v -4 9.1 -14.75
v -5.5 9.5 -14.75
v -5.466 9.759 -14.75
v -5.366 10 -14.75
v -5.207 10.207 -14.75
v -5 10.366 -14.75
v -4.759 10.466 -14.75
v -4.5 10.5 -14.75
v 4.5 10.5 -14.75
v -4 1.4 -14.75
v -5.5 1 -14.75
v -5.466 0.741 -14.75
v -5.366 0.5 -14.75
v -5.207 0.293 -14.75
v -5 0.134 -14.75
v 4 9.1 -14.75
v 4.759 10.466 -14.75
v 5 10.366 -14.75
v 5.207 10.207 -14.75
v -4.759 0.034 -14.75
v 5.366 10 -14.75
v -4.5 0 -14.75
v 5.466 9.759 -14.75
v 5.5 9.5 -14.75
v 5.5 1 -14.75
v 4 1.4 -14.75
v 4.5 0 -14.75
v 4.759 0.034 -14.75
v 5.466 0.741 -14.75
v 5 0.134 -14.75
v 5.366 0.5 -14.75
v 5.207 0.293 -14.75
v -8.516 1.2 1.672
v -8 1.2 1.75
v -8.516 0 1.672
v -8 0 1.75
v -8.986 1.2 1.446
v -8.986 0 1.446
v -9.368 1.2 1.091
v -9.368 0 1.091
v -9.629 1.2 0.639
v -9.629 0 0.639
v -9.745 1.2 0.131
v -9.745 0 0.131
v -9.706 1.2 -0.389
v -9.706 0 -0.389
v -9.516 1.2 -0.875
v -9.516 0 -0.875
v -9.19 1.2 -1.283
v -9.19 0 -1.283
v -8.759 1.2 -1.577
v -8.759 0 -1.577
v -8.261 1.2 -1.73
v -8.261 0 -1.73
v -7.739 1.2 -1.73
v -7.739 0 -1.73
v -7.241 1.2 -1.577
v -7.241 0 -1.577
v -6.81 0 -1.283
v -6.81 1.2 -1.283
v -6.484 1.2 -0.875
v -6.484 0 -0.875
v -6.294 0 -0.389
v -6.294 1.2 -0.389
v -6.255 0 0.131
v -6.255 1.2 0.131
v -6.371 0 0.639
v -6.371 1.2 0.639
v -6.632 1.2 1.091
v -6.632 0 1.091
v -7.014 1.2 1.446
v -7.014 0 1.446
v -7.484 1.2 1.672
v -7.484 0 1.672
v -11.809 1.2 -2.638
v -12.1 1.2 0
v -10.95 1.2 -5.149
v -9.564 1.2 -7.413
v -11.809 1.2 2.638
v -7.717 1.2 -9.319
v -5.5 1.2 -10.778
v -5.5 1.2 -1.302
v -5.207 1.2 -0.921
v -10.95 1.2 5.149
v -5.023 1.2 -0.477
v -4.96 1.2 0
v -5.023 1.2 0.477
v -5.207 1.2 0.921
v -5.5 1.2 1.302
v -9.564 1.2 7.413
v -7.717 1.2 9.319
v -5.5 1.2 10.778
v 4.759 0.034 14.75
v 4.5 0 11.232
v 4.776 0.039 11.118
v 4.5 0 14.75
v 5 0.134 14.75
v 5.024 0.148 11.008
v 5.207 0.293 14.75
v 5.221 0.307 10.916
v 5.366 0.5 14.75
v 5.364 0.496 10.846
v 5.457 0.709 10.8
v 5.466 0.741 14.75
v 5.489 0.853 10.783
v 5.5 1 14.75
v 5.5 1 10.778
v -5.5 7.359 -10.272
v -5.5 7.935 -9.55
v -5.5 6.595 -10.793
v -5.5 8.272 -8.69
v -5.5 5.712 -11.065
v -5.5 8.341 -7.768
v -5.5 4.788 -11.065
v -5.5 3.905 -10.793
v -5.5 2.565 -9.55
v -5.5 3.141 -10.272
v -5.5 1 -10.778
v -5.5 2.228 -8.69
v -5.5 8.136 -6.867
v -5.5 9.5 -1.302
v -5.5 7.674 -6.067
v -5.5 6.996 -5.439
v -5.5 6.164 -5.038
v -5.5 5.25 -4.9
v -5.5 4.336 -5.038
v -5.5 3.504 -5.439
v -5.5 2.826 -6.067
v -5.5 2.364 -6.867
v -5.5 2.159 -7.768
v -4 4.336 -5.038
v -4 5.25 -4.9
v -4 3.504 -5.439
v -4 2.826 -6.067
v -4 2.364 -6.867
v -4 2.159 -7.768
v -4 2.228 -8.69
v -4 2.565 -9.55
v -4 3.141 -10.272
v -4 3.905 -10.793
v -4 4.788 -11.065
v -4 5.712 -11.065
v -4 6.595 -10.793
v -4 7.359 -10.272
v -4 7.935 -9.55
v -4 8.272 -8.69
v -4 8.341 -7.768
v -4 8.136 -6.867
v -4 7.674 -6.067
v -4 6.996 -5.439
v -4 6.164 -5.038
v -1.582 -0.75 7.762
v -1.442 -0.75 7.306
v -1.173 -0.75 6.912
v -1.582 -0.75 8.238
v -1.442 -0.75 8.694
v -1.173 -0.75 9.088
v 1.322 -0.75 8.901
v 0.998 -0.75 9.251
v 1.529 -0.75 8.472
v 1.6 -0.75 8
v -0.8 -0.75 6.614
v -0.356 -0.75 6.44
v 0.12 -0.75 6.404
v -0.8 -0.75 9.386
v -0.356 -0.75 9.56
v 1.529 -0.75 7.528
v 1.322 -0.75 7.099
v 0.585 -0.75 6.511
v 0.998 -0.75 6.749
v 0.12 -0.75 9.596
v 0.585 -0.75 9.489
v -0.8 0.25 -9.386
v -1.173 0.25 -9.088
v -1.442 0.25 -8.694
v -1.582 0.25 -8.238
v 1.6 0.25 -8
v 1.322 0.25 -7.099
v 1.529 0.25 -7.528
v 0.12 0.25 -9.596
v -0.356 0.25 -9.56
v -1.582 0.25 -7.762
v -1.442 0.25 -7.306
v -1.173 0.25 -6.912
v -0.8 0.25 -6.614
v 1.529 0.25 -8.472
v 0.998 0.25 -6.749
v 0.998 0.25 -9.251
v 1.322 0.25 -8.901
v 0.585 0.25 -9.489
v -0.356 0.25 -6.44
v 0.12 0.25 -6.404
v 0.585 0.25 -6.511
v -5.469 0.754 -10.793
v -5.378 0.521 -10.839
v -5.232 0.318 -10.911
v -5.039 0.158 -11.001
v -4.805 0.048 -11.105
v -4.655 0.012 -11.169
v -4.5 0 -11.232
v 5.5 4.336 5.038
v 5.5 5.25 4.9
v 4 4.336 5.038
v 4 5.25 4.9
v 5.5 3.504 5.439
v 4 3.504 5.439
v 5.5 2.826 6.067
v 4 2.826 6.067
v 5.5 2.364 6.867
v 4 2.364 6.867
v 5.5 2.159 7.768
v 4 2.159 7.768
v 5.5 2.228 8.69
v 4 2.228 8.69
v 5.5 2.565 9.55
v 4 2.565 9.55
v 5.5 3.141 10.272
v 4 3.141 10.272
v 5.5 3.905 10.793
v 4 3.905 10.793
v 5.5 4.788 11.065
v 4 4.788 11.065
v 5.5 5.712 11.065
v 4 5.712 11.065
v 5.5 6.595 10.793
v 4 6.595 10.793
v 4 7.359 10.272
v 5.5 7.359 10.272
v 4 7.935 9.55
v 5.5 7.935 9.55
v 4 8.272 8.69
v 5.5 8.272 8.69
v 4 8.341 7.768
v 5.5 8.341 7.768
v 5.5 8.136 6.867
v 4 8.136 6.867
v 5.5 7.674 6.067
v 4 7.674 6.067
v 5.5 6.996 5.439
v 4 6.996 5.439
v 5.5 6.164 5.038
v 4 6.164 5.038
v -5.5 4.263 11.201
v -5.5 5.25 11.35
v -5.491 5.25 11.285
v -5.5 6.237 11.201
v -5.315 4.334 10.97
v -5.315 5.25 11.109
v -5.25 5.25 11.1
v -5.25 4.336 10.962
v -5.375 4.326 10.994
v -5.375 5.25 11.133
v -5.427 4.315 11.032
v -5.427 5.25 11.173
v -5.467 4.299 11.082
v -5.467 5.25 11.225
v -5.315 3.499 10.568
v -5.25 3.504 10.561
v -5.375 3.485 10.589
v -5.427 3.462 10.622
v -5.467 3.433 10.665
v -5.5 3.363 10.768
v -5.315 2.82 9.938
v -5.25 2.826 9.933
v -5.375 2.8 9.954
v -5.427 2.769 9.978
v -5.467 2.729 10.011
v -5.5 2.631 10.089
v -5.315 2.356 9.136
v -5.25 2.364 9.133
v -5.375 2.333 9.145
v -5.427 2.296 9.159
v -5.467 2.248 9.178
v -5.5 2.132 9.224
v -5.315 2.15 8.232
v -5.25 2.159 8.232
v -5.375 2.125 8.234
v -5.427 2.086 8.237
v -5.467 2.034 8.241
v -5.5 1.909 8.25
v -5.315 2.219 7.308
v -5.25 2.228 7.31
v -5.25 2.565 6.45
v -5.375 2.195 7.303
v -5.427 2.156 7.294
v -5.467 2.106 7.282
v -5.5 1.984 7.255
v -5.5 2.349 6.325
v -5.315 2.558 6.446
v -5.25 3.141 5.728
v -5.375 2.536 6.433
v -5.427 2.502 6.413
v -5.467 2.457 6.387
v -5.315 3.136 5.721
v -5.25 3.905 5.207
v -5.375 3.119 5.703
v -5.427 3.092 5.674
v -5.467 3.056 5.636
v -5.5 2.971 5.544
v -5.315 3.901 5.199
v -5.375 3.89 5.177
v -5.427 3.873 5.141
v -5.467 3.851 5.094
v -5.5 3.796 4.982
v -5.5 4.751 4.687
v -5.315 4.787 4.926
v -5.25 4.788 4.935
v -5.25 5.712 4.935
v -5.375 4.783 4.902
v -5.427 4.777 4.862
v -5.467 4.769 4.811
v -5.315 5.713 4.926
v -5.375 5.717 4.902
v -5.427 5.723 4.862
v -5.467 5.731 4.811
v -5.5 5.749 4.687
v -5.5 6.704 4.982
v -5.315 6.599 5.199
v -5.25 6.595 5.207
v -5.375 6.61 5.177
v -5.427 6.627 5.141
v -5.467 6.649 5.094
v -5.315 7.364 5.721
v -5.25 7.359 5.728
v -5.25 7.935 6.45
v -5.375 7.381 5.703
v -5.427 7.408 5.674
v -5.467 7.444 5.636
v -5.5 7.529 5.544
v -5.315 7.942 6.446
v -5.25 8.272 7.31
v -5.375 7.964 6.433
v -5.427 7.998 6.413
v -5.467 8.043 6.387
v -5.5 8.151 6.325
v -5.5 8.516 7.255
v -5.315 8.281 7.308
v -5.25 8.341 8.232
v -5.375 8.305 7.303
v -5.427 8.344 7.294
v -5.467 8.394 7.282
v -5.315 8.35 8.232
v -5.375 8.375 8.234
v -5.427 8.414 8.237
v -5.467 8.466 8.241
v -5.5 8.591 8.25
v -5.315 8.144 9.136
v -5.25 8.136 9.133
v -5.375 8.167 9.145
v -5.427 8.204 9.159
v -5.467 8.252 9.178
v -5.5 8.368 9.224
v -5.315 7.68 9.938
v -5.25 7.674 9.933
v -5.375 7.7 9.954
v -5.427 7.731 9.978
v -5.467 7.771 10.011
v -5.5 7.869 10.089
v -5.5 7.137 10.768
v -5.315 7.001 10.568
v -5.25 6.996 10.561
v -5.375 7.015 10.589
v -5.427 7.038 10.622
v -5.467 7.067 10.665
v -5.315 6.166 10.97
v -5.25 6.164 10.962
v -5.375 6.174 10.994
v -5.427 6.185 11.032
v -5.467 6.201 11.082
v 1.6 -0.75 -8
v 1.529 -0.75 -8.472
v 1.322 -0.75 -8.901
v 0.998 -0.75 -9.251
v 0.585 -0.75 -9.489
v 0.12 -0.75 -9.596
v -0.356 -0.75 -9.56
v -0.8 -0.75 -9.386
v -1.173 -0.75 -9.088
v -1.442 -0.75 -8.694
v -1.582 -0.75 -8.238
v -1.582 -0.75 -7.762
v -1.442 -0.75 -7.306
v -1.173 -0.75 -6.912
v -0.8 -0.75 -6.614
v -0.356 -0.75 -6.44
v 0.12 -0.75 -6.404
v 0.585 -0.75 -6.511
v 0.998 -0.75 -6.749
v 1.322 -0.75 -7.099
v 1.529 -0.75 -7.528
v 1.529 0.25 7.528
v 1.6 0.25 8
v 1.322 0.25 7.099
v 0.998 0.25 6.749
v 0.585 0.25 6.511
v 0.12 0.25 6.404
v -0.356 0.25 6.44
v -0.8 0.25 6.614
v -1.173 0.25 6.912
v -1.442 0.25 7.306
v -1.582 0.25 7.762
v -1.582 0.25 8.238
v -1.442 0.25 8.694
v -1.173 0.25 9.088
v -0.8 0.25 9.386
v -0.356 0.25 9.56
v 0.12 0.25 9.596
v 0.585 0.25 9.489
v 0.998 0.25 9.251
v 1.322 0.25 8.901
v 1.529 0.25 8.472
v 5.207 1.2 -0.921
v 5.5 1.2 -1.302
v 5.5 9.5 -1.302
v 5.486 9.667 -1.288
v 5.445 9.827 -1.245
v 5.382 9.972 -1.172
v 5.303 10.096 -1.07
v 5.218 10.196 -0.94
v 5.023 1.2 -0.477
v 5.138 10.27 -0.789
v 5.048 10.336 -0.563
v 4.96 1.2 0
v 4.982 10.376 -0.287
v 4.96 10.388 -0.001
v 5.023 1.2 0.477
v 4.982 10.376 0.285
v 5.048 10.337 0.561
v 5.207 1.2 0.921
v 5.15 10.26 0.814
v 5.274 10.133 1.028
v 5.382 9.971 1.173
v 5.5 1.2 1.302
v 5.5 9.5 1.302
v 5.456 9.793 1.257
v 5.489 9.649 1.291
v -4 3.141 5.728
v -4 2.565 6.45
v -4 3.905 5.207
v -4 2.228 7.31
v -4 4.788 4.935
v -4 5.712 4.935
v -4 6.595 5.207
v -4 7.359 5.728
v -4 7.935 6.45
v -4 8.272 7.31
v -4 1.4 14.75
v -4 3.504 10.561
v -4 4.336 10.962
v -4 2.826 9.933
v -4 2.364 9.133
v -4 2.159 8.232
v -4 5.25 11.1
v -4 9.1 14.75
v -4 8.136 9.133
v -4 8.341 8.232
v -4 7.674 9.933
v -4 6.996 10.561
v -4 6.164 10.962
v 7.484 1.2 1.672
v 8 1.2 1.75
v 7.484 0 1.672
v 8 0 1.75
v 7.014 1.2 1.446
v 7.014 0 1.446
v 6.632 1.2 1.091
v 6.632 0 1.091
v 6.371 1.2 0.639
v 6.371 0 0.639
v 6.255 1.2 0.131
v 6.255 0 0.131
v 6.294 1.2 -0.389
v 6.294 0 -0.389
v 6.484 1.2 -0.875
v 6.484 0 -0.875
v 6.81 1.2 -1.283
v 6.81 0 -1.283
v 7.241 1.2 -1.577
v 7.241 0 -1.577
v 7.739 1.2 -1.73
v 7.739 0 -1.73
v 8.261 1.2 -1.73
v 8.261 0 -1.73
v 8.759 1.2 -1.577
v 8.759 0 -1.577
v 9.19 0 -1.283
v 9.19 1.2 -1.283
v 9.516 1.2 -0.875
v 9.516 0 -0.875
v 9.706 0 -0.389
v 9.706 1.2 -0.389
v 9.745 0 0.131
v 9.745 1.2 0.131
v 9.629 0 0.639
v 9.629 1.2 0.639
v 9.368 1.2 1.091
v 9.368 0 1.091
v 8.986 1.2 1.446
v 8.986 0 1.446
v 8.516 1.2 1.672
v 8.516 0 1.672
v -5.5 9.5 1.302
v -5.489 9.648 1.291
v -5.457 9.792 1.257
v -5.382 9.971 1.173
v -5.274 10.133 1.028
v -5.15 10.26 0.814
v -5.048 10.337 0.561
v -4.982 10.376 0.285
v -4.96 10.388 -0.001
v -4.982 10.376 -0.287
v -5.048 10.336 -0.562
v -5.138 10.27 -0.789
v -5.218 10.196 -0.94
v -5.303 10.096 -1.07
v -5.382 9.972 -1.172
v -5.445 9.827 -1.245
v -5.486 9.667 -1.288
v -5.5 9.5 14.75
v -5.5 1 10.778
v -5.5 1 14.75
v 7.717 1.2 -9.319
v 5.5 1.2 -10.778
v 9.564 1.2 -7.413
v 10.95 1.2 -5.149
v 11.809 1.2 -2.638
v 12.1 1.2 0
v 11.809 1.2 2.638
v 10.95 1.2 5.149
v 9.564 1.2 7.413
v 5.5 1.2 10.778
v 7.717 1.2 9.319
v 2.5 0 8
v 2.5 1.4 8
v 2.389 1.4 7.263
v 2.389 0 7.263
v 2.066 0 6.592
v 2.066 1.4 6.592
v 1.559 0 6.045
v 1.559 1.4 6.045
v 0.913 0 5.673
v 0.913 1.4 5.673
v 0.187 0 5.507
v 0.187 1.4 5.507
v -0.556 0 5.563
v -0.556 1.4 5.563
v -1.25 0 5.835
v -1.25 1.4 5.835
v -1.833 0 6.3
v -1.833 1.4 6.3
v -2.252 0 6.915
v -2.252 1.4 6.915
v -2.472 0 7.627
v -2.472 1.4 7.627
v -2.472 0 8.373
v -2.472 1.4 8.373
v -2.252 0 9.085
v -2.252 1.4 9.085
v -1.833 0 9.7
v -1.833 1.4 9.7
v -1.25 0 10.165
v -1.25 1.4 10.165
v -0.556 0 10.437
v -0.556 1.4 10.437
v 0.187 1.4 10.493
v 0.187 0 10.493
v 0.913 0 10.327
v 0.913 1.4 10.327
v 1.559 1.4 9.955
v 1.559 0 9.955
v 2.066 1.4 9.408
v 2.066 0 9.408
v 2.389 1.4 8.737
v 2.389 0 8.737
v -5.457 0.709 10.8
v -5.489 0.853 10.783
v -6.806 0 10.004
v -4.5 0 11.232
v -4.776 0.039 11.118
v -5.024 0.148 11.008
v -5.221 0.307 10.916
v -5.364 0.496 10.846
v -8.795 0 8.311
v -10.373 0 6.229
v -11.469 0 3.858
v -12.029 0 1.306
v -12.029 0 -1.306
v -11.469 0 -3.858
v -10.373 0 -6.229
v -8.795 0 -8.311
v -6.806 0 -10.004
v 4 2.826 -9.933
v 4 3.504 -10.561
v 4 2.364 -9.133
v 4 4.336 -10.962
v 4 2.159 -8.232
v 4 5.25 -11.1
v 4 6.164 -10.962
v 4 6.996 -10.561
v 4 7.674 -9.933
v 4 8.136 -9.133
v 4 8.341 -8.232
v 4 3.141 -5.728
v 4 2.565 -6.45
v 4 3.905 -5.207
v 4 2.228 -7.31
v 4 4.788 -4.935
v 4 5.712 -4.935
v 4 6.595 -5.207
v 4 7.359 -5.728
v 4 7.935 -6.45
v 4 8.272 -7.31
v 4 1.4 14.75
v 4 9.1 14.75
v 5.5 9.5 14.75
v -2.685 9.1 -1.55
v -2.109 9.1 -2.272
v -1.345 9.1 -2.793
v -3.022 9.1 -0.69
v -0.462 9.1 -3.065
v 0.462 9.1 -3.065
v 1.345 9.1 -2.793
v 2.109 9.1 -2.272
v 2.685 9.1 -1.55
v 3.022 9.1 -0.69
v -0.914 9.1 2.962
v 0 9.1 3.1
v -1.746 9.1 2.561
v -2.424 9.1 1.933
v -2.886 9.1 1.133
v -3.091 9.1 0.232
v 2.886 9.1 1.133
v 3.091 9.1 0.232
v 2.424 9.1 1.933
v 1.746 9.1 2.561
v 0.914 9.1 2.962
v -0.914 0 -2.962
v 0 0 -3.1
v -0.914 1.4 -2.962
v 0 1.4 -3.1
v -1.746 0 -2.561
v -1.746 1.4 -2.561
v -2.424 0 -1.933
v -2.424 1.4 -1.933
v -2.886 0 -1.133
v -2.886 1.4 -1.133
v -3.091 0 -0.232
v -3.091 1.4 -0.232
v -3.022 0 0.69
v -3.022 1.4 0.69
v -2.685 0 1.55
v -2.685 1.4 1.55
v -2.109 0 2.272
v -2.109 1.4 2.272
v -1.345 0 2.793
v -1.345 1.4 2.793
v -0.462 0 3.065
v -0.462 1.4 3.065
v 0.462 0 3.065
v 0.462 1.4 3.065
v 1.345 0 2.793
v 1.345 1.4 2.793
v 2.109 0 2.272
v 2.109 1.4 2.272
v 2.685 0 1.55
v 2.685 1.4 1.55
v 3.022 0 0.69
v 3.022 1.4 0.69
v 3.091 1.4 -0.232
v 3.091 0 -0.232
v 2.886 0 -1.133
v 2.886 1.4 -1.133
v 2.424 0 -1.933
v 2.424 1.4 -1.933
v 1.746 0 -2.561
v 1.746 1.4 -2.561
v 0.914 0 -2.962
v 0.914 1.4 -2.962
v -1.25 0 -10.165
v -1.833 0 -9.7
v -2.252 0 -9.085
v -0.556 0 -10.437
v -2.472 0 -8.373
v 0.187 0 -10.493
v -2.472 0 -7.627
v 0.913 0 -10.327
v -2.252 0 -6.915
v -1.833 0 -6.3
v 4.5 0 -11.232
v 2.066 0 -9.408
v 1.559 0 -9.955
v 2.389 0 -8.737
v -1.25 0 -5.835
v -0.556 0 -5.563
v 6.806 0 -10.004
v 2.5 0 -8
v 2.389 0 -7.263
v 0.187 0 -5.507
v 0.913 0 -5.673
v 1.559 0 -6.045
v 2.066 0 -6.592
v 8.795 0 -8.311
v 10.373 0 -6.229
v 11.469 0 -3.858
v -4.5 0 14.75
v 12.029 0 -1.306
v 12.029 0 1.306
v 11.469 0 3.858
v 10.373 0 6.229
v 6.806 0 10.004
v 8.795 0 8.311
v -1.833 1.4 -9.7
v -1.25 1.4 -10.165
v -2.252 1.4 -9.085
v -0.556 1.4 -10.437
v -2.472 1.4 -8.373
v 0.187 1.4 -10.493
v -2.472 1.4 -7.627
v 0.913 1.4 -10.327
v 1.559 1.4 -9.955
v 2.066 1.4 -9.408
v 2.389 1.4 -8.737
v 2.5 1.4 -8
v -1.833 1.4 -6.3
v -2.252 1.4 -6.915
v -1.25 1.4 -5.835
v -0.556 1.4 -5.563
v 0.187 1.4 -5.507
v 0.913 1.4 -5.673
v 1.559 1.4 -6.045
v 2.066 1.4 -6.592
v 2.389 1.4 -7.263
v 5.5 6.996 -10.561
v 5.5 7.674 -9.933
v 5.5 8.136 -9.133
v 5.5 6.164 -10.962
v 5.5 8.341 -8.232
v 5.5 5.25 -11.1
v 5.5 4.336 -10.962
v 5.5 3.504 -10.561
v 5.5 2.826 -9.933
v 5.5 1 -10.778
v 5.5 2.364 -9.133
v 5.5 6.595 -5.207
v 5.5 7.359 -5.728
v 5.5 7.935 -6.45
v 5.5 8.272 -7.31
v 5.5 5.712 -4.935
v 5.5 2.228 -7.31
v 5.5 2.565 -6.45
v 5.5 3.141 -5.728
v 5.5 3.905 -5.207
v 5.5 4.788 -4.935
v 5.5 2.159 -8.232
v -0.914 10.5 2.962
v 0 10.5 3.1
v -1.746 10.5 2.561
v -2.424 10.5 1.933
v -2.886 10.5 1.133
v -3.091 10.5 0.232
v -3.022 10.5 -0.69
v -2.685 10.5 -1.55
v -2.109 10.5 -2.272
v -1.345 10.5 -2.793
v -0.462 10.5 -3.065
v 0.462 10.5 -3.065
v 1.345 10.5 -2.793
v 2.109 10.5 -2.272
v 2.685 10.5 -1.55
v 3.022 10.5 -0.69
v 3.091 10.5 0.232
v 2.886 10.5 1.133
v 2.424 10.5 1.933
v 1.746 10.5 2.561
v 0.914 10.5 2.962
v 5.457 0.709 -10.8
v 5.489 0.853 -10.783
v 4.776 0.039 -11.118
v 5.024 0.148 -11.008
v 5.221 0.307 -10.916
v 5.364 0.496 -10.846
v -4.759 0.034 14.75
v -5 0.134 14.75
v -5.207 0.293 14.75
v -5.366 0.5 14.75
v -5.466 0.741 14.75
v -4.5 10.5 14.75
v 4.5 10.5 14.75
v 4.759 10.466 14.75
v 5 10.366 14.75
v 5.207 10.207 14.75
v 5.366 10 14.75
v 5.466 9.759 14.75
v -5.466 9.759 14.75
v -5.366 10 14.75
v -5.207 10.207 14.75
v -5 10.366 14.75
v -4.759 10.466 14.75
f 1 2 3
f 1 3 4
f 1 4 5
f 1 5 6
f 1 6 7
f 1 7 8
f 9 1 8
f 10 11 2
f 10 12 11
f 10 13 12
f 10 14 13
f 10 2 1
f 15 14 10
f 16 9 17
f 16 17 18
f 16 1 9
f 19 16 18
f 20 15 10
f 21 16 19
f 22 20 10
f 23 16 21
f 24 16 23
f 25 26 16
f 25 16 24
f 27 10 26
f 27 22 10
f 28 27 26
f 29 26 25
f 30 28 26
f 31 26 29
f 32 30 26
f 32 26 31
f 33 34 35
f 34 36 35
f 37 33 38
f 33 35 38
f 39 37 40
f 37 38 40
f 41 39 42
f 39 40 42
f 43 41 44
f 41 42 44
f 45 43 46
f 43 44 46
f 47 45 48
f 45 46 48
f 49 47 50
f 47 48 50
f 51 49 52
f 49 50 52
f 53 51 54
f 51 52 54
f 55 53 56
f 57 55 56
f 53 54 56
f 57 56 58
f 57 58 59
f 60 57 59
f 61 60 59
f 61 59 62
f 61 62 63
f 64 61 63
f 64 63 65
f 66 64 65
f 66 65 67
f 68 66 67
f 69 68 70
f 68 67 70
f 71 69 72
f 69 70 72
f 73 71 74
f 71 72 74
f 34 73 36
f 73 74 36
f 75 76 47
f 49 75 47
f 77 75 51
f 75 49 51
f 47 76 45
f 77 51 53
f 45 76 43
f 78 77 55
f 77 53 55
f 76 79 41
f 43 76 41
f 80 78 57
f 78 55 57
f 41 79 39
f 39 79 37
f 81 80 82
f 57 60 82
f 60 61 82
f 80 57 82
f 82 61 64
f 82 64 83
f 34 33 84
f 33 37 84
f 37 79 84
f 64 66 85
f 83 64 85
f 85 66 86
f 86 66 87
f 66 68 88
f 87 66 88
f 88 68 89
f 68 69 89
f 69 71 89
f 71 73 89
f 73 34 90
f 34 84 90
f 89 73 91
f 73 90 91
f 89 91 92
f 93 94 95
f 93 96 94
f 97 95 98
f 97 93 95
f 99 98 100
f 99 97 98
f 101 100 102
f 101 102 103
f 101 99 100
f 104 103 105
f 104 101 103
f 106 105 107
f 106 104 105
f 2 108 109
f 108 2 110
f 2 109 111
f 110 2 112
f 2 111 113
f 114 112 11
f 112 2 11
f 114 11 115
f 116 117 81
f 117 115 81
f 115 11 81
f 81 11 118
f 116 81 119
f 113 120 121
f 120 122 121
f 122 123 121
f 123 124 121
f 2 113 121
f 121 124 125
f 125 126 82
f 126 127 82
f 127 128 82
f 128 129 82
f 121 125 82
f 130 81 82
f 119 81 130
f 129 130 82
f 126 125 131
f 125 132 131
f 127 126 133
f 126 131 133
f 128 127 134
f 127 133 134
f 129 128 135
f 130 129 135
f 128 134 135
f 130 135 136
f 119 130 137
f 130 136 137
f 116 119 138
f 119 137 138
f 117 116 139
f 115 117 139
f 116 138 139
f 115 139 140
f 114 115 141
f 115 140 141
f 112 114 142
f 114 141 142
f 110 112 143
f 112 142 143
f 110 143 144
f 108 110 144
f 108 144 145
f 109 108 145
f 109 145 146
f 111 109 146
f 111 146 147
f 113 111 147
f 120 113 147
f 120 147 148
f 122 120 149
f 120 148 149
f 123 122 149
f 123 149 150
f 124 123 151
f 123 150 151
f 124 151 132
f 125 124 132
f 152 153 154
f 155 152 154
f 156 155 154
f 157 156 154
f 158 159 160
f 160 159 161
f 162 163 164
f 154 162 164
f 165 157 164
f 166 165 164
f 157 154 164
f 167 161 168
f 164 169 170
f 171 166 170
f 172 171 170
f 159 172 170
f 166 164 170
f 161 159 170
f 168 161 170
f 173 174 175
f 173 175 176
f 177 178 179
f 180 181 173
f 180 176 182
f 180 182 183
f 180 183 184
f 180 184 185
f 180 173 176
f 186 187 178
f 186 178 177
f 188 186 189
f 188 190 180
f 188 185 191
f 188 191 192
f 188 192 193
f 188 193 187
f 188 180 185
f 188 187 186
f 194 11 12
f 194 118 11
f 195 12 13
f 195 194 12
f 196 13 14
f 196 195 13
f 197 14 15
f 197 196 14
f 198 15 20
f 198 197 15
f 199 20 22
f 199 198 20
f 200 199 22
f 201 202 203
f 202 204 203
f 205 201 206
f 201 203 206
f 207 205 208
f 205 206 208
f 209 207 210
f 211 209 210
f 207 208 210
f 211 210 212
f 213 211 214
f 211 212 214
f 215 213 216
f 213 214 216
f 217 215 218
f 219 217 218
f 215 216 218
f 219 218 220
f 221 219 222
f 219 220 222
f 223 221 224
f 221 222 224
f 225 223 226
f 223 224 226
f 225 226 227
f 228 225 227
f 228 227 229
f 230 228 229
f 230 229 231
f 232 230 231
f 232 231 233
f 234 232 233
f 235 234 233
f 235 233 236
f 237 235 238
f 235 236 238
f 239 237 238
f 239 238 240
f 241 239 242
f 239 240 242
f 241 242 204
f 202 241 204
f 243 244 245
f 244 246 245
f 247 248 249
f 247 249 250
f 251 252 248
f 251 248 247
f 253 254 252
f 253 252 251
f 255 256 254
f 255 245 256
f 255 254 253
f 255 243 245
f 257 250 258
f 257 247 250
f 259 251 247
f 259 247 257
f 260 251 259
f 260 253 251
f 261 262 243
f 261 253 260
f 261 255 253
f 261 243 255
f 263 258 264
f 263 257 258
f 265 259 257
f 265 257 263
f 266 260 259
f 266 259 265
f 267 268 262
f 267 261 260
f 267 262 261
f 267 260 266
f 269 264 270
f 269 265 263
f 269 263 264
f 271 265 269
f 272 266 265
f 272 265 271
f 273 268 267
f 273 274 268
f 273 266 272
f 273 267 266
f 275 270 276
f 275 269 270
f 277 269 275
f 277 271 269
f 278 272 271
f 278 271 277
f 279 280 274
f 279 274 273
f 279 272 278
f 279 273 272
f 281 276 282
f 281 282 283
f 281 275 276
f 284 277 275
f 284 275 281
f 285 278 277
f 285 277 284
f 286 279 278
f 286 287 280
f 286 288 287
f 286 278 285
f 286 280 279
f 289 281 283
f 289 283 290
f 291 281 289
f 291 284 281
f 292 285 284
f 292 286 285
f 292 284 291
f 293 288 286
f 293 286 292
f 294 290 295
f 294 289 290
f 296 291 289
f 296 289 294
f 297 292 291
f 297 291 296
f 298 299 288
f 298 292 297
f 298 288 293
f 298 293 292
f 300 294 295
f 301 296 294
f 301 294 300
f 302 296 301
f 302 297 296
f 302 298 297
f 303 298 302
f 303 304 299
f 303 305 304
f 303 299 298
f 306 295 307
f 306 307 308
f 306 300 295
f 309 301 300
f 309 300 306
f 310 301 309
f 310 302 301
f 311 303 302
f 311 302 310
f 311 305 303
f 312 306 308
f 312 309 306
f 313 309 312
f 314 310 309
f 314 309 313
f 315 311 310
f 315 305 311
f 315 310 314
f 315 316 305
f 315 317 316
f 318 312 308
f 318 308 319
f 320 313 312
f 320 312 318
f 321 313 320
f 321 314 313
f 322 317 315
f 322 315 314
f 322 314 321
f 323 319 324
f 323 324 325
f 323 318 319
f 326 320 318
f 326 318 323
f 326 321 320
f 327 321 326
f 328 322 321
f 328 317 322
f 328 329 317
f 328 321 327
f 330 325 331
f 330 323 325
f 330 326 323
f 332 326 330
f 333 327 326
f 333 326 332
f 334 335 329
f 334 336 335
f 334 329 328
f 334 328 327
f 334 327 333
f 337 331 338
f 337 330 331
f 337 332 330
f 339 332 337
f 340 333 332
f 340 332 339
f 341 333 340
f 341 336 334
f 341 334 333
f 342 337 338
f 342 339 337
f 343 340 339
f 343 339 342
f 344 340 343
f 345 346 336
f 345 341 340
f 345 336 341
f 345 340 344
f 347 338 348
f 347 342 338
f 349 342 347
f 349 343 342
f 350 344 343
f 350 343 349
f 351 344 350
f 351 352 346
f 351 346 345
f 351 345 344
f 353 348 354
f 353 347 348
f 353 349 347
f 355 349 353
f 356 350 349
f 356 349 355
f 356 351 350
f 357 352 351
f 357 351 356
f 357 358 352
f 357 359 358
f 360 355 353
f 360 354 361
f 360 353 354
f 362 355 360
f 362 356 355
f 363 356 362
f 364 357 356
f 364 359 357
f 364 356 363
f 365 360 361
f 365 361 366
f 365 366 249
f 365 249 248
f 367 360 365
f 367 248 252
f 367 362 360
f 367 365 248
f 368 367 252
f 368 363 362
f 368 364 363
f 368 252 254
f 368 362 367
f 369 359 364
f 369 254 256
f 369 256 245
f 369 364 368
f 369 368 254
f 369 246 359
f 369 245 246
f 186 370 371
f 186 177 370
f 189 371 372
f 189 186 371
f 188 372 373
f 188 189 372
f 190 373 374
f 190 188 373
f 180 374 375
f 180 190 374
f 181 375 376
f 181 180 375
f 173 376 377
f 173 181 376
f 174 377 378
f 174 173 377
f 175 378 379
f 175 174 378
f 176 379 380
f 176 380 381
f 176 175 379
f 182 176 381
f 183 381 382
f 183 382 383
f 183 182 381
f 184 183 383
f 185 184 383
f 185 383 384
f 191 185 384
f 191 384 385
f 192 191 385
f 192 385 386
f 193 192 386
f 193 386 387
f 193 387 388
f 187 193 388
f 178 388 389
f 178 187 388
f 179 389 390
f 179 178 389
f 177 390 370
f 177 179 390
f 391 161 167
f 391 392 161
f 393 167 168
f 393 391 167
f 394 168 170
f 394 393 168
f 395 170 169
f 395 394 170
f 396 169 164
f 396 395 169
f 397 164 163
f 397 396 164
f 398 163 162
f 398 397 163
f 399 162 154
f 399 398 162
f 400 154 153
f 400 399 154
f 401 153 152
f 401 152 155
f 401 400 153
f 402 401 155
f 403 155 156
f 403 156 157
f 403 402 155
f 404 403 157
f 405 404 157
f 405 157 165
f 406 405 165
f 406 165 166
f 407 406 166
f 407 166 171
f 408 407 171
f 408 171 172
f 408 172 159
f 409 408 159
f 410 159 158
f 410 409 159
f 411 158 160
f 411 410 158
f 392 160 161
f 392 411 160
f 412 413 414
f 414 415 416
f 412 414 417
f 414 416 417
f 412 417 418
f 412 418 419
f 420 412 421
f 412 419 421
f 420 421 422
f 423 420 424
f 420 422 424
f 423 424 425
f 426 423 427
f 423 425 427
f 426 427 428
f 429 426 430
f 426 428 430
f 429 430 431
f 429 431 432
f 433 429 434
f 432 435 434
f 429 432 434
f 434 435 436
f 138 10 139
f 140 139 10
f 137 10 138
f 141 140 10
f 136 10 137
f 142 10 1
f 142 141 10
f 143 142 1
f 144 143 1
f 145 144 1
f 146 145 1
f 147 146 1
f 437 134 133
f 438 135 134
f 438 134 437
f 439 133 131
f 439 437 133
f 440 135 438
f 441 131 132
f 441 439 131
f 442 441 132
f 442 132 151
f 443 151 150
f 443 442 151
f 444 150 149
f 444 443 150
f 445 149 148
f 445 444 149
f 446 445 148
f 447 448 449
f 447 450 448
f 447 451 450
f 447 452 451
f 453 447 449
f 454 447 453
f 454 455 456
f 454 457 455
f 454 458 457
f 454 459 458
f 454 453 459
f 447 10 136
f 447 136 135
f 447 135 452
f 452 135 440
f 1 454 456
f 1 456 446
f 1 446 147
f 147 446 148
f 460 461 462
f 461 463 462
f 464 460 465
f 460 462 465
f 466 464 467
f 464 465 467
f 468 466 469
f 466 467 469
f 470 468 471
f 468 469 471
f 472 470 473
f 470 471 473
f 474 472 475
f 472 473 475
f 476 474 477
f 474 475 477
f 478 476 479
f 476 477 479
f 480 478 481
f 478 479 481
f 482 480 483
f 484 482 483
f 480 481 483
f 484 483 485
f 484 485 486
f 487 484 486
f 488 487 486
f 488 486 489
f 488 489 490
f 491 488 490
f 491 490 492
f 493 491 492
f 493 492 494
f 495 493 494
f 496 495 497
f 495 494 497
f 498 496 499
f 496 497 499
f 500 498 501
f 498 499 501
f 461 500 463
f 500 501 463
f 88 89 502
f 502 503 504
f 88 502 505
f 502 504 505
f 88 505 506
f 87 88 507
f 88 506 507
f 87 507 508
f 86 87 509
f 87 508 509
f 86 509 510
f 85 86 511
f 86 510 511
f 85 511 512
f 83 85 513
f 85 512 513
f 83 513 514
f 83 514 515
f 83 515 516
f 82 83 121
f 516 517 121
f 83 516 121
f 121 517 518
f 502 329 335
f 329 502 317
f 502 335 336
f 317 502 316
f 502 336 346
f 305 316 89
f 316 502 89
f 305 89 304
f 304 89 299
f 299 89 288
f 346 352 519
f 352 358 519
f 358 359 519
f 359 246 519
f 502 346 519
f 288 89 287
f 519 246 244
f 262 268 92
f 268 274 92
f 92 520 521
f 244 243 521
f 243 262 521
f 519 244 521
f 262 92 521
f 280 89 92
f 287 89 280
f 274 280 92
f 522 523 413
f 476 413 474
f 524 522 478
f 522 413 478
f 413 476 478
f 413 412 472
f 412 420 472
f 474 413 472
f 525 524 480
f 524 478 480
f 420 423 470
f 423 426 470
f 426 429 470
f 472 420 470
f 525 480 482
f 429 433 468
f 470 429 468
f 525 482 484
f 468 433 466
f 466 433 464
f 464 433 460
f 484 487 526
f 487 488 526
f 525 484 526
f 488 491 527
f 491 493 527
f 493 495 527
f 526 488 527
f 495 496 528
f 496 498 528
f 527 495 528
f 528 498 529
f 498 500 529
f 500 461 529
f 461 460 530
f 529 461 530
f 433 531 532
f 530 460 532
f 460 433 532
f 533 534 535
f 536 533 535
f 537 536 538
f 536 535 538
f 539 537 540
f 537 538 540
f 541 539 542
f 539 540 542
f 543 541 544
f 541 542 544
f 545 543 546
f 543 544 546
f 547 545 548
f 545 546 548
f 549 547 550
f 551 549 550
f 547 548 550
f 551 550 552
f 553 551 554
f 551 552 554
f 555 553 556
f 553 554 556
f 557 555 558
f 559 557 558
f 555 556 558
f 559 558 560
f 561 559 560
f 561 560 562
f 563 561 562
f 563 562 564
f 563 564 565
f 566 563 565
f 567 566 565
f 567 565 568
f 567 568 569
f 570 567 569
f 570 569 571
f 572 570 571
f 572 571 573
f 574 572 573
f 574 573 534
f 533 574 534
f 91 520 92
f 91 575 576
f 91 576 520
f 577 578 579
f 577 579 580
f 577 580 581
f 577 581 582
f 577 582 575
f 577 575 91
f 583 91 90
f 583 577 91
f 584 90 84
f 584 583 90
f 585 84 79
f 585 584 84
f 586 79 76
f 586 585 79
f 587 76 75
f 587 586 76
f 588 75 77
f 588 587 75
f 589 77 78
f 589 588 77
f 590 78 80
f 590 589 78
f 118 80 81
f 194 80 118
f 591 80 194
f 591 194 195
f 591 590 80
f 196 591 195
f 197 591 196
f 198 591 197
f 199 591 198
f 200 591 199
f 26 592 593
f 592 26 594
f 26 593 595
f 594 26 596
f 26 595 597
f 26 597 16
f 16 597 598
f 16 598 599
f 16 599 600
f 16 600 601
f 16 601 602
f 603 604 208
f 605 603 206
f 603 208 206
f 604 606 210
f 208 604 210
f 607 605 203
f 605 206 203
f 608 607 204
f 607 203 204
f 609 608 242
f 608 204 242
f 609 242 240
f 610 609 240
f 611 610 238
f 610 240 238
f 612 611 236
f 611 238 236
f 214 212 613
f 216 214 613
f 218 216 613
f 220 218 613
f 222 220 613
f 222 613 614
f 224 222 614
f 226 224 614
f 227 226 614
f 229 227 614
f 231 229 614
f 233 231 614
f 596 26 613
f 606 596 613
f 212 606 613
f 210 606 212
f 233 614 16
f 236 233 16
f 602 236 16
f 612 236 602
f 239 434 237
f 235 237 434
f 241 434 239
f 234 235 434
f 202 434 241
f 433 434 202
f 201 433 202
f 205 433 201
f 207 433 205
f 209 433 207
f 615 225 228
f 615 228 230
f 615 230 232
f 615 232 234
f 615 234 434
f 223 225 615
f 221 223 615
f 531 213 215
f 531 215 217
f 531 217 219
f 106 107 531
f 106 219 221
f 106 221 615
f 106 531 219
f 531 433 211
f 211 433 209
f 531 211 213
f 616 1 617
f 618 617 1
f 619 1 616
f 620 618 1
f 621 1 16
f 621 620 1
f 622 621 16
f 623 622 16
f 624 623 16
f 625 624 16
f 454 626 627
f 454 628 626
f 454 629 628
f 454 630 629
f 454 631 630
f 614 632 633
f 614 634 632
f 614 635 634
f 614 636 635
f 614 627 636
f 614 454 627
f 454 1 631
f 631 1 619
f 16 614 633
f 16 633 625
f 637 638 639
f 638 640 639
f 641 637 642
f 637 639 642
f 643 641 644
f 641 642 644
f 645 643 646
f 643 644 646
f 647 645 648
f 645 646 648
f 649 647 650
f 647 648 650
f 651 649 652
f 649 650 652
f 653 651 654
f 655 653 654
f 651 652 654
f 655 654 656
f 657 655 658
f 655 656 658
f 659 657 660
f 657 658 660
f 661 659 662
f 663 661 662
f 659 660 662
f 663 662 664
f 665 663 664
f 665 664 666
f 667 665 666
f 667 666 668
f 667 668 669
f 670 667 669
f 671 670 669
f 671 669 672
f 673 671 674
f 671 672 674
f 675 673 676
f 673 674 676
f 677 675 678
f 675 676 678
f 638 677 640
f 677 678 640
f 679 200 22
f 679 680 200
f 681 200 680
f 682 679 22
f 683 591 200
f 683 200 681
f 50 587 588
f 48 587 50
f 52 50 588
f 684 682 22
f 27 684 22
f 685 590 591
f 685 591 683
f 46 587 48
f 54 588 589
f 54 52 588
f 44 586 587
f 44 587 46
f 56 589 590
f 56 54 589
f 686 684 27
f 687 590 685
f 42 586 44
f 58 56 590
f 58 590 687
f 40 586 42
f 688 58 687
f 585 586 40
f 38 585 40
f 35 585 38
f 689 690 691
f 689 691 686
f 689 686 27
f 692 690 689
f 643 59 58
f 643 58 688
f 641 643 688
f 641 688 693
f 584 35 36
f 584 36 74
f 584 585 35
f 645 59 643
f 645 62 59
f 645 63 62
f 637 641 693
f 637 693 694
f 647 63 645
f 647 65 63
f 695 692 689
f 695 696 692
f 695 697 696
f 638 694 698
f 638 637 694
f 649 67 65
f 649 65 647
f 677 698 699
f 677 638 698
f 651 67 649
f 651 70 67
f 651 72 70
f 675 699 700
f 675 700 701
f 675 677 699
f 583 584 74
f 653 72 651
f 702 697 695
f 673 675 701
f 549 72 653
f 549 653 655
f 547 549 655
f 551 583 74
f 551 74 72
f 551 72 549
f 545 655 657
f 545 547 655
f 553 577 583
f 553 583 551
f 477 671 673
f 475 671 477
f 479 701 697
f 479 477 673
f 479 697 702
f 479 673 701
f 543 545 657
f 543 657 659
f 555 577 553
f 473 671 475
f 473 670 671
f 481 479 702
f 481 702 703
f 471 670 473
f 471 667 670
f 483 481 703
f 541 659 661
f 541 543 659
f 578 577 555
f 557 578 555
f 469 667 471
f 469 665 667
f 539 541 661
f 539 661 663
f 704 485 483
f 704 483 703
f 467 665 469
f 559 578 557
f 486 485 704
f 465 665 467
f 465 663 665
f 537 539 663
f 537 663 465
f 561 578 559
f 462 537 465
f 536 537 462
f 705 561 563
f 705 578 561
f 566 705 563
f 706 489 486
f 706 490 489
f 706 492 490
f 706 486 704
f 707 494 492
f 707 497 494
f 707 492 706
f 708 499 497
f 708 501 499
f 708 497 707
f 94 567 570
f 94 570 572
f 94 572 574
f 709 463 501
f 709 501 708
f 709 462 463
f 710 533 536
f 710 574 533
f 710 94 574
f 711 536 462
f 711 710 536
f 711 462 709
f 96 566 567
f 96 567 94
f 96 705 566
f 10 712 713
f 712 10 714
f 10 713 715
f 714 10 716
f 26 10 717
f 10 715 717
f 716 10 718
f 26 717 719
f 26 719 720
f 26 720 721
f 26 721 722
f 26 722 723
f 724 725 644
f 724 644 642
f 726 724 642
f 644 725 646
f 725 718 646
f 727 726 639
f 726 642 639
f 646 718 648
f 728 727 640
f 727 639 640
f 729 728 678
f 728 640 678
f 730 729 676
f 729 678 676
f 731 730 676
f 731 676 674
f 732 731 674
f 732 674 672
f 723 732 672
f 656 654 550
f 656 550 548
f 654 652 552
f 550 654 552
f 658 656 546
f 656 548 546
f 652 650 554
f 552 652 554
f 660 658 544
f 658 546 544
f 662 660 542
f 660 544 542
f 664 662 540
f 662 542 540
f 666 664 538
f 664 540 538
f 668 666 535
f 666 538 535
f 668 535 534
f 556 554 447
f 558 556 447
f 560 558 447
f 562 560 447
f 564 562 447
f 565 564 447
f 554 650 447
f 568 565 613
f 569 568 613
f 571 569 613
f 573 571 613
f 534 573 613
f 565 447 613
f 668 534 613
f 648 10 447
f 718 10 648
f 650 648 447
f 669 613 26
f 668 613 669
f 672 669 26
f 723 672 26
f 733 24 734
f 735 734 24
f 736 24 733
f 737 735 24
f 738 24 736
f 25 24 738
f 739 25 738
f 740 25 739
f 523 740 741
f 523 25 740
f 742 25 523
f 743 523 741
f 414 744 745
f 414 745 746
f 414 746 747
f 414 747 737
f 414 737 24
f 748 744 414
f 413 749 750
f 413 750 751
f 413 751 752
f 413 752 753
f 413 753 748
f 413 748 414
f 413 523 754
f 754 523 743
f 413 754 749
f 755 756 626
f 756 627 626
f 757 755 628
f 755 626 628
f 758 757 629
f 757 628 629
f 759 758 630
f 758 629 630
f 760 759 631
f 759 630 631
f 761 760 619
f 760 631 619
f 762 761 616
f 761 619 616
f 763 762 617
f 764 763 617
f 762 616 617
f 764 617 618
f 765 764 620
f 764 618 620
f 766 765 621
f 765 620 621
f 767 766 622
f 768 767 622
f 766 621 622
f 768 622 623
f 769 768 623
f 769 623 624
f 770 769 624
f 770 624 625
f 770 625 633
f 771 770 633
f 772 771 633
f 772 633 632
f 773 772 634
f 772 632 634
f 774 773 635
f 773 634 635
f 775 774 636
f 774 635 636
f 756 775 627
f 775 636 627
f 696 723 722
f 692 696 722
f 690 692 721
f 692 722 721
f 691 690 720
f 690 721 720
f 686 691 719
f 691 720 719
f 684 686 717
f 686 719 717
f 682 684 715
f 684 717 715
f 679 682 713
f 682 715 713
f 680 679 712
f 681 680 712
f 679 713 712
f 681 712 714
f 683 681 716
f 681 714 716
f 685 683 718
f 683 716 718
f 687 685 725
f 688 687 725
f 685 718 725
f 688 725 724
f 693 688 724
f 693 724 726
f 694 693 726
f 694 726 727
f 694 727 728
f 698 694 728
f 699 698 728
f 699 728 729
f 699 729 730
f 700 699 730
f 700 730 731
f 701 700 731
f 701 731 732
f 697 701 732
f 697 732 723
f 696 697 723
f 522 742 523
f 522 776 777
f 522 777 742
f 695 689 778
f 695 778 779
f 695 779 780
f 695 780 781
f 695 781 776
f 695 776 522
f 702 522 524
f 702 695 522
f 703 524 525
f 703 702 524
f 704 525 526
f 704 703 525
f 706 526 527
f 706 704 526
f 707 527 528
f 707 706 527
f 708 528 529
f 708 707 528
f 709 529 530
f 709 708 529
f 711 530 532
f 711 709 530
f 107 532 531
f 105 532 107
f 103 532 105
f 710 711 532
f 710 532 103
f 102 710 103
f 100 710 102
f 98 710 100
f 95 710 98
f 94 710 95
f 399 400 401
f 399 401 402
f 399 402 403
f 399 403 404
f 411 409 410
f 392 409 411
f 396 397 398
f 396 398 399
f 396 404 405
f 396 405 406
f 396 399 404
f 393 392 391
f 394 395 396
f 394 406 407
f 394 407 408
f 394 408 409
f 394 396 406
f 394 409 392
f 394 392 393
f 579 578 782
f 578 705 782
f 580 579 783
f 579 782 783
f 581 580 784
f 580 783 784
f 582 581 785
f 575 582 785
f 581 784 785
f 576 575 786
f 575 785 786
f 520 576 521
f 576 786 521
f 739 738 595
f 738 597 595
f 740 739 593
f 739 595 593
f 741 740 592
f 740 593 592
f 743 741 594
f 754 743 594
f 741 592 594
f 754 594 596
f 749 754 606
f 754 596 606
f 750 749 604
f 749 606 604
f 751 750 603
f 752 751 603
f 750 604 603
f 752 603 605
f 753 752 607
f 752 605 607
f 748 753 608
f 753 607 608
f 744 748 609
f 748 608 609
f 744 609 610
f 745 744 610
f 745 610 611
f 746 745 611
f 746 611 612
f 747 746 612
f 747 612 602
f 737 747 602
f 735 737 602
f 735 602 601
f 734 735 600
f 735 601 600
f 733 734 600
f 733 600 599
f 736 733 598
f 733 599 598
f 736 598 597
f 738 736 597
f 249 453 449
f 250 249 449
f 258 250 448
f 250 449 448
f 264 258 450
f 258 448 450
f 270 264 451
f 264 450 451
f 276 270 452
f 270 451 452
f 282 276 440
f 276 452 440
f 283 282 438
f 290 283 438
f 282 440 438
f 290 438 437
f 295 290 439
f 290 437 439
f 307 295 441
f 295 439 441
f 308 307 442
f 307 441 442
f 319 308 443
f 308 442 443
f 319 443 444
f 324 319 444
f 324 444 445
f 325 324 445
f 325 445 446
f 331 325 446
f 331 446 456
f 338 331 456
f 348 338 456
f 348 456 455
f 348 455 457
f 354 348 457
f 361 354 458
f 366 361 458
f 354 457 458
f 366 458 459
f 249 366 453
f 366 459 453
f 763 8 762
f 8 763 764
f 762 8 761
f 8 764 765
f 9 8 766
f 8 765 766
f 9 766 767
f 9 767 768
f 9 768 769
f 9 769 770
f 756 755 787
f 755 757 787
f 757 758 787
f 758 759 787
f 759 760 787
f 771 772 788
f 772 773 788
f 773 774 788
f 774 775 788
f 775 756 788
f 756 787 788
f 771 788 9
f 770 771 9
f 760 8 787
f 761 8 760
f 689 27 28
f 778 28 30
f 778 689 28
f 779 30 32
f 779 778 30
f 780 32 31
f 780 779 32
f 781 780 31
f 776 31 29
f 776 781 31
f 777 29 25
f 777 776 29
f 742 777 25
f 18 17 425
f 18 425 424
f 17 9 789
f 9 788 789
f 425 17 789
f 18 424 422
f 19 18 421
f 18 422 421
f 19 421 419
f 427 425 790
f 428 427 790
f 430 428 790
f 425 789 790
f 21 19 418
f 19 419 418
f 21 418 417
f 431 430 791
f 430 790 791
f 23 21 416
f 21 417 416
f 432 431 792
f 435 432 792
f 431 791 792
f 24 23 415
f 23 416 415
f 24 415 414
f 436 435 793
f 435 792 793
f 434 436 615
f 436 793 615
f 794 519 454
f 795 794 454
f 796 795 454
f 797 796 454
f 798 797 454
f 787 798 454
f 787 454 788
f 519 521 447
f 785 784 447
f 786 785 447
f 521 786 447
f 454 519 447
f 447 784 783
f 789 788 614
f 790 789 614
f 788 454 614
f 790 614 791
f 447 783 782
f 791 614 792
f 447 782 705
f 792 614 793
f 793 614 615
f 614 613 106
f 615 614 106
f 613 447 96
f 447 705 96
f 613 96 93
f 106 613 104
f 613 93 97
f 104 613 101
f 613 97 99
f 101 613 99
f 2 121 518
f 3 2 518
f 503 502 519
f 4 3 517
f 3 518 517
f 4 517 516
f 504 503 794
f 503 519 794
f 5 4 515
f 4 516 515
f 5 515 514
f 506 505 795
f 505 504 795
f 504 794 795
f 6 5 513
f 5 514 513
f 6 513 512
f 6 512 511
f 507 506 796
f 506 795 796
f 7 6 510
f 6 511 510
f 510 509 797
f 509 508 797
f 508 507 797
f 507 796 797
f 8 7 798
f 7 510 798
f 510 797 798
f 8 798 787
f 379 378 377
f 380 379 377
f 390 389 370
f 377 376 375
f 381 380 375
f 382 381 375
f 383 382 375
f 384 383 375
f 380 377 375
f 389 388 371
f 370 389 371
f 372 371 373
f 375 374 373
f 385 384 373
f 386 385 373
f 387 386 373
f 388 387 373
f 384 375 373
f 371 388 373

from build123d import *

# Parameters (mm, degrees)
SKETCH1_W                           = 11
SKETCH1_H                           = 29.5
BOSS_EXTRUDE1_DEPTH                 = 10.5
BOSS_EXTRUDE2_DEPTH                 = 1.2
CUT_EXTRUDE1_DEPTH                  = 9.3
BOSS_EXTRUDE3_DEPTH                 = 1.2
CUT_EXTRUDE2_DEPTH                  = 9.3
SKETCH6_W                           = 8
SKETCH6_H                           = 7.7
CUT_EXTRUDE3_DEPTH                  = 30.5
F_5_0_5_DIAMETER_HOLE1_D            = 5
F_5_0_5_DIAMETER_HOLE1_DEPTH        = 1.4
F_5_0_5_DIAMETER_HOLE2_D            = 5
F_5_0_5_DIAMETER_HOLE2_DEPTH        = 1.4
SKETCH11_W                          = 1.6
SKETCH11_H                          = 1
SKETCH12_W                          = 1.6
SKETCH12_H                          = 1
SKETCH13_W                          = 3.1
SKETCH13_H                          = 1.4
SKETCH15_W                          = 1.75
SKETCH15_H                          = 1.2
F_3_5_3_5_DIAMETER_HOLE1_AT_2_COUNT = 2
F_3_5_3_5_DIAMETER_HOLE1_AT_2_PITCH = 16
SKETCH17_W                          = 3.1
SKETCH17_H                          = 1.5
F_6_2_6_2_DIAMETER_HOLE2_AT_2_COUNT = 2
F_6_2_6_2_DIAMETER_HOLE2_AT_2_PITCH = 16
SKETCH19_W                          = 3.1
SKETCH19_H                          = 1.5
F_6_2_6_2_DIAMETER_HOLE3_AT_2_COUNT = 2
F_6_2_6_2_DIAMETER_HOLE3_AT_2_PITCH = 16
SKETCH21_W                          = 3.1
SKETCH21_H                          = 1.4
FILLET1_R                           = 1
FILLET3_R                           = 0.25


with BuildPart() as part:
    # Sketch1 → Boss-Extrude1 (new body)
    with BuildSketch(Plane.XZ):
        Rectangle(SKETCH1_W, SKETCH1_H)
    extrude(amount=-BOSS_EXTRUDE1_DEPTH)

    # Sketch2 → Boss-Extrude2 (add)
    with BuildSketch(Plane.XZ):
        with BuildLine():
            Line((-5.5, -10.777754868), (-5.5, 10.777754868))
            ThreePointArc((-5.5, 10.777754868), (-12.1, 0), (-5.5, -10.777754868))
        make_face()
    extrude(amount=-BOSS_EXTRUDE2_DEPTH)

    # Sketch3 → Cut-Extrude1 (cut)
    with BuildSketch(Plane(origin=(0, 10.5, 0), x_dir=(-1, 0, 0), z_dir=(0, 1, 0))):
        with BuildLine():
            Line((5.5, -1.302152065), (5.5, 1.302152065))
            ThreePointArc((5.5, 1.302152065), (4.96, 0), (5.5, -1.302152065))
        make_face()
    extrude(amount=-CUT_EXTRUDE1_DEPTH, mode=Mode.SUBTRACT)

    # Sketch4 → Boss-Extrude3 (add)
    with BuildSketch(Plane.XZ):
        with BuildLine():
            Line((5.5, 10.777754868), (5.5, -10.777754868))
            ThreePointArc((5.5, -10.777754868), (12.1, 0), (5.5, 10.777754868))
        make_face()
    extrude(amount=-BOSS_EXTRUDE3_DEPTH)

    # Sketch5 → Cut-Extrude2 (cut)
    with BuildSketch(Plane(origin=(0, 10.5, 0), x_dir=(-1, 0, 0), z_dir=(0, 1, 0))):
        with BuildLine():
            Line((-5.5, 1.302152065), (-5.5, -1.302152065))
            ThreePointArc((-5.5, -1.302152065), (-4.96, 0), (-5.5, 1.302152065))
        make_face()
    extrude(amount=-CUT_EXTRUDE2_DEPTH, mode=Mode.SUBTRACT)

    # Sketch6 → Cut-Extrude3 (cut, through all)
    with BuildSketch(Plane.XY.offset(14.75)):
        with Locations((0, 5.25)):
            Rectangle(SKETCH6_W, SKETCH6_H)
    extrude(amount=-CUT_EXTRUDE3_DEPTH, mode=Mode.SUBTRACT)

    # Ø5.0 (5) Diameter Hole1
    with Locations(Plane(origin=(0, 0, 0), x_dir=(-1, 0, 0), z_dir=(0, -1, 0))):
        with Locations((0, -8)):
            Hole(F_5_0_5_DIAMETER_HOLE1_D / 2, depth=F_5_0_5_DIAMETER_HOLE1_DEPTH)

    # Ø5.0 (5) Diameter Hole2
    with Locations(Plane(origin=(0, 0, 0), x_dir=(-1, 0, 0), z_dir=(0, -1, 0))):
        with Locations((0, 8)):
            Hole(F_5_0_5_DIAMETER_HOLE2_D / 2, depth=F_5_0_5_DIAMETER_HOLE2_DEPTH)

    # Sketch13 → Ø6.2 (6.2) Diameter Hole1 (revolve, cut)
    with BuildSketch(Plane(origin=(0, 0, 0), x_dir=(0, 0, -1), z_dir=(1, 0, 0))):
        with Locations((1.55, 0.7)):
            Rectangle(SKETCH13_W, SKETCH13_H)
    revolve(axis=Axis((0, -6.35, 0), (0, 1, 0)), mode=Mode.SUBTRACT)

    # Sketch15 → Ø3.5 (3.5) Diameter Hole1 (revolve, cut)
    with BuildSketch(Plane(origin=(8, 1.2, 0), x_dir=(0, 0, 1), z_dir=(1, 0, 0))):
        with Locations((0.875, 0.6)):
            Rectangle(SKETCH15_W, SKETCH15_H)
    f_3_5_3_5_diameter_hole1 = revolve(axis=Axis((8, 7.55, 0), (0, -1, 0)), mode=Mode.SUBTRACT)

    # Ø3.5 (3.5) Diameter Hole1 at 2: Ø3.5 (3.5) Diameter Hole1 ×2
    with Locations(*[(-i * F_3_5_3_5_DIAMETER_HOLE1_AT_2_PITCH, 0, 0) for i in range(1, F_3_5_3_5_DIAMETER_HOLE1_AT_2_COUNT)]):
        add(f_3_5_3_5_diameter_hole1, mode=Mode.SUBTRACT)

    # Sketch17 → Ø6.2 (6.2) Diameter Hole2 (revolve, cut)
    with BuildSketch(Plane(origin=(5.5, 5.25, 8), x_dir=(0, 0, -1), z_dir=(0, 1, 0))):
        with Locations((1.55, 0.75)):
            Rectangle(SKETCH17_W, SKETCH17_H)
    f_6_2_6_2_diameter_hole2 = revolve(axis=Axis((11.85, 5.25, 8), (-1, 0, 0)), mode=Mode.SUBTRACT)

    # Ø6.2 (6.2) Diameter Hole2 at 2: Ø6.2 (6.2) Diameter Hole2 ×2
    with Locations(*[(0, 0, -i * F_6_2_6_2_DIAMETER_HOLE2_AT_2_PITCH) for i in range(1, F_6_2_6_2_DIAMETER_HOLE2_AT_2_COUNT)]):
        add(f_6_2_6_2_diameter_hole2, mode=Mode.SUBTRACT)

    # Sketch19 → Ø6.2 (6.2) Diameter Hole3 (revolve, cut)
    with BuildSketch(Plane(origin=(-5.5, 5.25, 8), x_dir=(0, 0, 1), z_dir=(0, 1, 0))):
        with Locations((1.55, 0.75)):
            Rectangle(SKETCH19_W, SKETCH19_H)
    f_6_2_6_2_diameter_hole3 = revolve(axis=Axis((-11.85, 5.25, 8), (1, 0, 0)), mode=Mode.SUBTRACT)

    # Ø6.2 (6.2) Diameter Hole3 at 2: Ø6.2 (6.2) Diameter Hole3 ×2
    with Locations(*[(0, 0, -i * F_6_2_6_2_DIAMETER_HOLE3_AT_2_PITCH) for i in range(1, F_6_2_6_2_DIAMETER_HOLE3_AT_2_COUNT)]):
        add(f_6_2_6_2_diameter_hole3, mode=Mode.SUBTRACT)

    # Sketch21 → Ø6.2 (6.2) Diameter Hole4 (revolve, cut)
    with BuildSketch(Plane(origin=(0, 10.5, 0), x_dir=(0, 0, 1), z_dir=(1, 0, 0))):
        with Locations((1.55, 0.7)):
            Rectangle(SKETCH21_W, SKETCH21_H)
    revolve(axis=Axis((0, 16.85, 0), (0, -1, 0)), mode=Mode.SUBTRACT)

    # Fillet1
    fillet1_edges = [part.edges().sort_by_distance(p)[0] for p in [
        (5.5, 0, -12.763877434),
        (-5.5, 0, 12.763877434),
        (-5.5, 0, -12.763877434),
        (5.5, 10.5, 8.026076032),
        (5.5, 0, 12.763877434),
        (-5.5, 10.5, -8.026076032),
    ]]
    fillet(fillet1_edges, radius=FILLET1_R)

    # Fillet3
    fillet3_edges = [part.edges().sort_by_distance(p)[0] for p in [
        (-5.5, 5.25, 4.9),
    ]]
    fillet(fillet3_edges, radius=FILLET3_R)


with BuildPart() as body_2:
    # Sketch11 → Revolve1 (revolve)
    with BuildSketch(Plane(origin=(0, 0, -8), x_dir=(-1, 0, 0), z_dir=(0, 0, -1))):
        with Locations((-0.8, -0.25)):
            Rectangle(SKETCH11_W, SKETCH11_H)
    revolve(axis=Axis((0, -0.75, -8), (0, 1, 0)))


with BuildPart() as body_3:
    # Sketch12 → Revolve2 (revolve)
    with BuildSketch(Plane(origin=(0, 0, 8), x_dir=(-1, 0, 0), z_dir=(0, 0, -1))):
        with Locations((-0.8, -0.25)):
            Rectangle(SKETCH12_W, SKETCH12_H)
    revolve(axis=Axis((0, -0.75, 8), (0, 1, 0)))


solid = Compound([part.part, body_2.part, body_3.part])
